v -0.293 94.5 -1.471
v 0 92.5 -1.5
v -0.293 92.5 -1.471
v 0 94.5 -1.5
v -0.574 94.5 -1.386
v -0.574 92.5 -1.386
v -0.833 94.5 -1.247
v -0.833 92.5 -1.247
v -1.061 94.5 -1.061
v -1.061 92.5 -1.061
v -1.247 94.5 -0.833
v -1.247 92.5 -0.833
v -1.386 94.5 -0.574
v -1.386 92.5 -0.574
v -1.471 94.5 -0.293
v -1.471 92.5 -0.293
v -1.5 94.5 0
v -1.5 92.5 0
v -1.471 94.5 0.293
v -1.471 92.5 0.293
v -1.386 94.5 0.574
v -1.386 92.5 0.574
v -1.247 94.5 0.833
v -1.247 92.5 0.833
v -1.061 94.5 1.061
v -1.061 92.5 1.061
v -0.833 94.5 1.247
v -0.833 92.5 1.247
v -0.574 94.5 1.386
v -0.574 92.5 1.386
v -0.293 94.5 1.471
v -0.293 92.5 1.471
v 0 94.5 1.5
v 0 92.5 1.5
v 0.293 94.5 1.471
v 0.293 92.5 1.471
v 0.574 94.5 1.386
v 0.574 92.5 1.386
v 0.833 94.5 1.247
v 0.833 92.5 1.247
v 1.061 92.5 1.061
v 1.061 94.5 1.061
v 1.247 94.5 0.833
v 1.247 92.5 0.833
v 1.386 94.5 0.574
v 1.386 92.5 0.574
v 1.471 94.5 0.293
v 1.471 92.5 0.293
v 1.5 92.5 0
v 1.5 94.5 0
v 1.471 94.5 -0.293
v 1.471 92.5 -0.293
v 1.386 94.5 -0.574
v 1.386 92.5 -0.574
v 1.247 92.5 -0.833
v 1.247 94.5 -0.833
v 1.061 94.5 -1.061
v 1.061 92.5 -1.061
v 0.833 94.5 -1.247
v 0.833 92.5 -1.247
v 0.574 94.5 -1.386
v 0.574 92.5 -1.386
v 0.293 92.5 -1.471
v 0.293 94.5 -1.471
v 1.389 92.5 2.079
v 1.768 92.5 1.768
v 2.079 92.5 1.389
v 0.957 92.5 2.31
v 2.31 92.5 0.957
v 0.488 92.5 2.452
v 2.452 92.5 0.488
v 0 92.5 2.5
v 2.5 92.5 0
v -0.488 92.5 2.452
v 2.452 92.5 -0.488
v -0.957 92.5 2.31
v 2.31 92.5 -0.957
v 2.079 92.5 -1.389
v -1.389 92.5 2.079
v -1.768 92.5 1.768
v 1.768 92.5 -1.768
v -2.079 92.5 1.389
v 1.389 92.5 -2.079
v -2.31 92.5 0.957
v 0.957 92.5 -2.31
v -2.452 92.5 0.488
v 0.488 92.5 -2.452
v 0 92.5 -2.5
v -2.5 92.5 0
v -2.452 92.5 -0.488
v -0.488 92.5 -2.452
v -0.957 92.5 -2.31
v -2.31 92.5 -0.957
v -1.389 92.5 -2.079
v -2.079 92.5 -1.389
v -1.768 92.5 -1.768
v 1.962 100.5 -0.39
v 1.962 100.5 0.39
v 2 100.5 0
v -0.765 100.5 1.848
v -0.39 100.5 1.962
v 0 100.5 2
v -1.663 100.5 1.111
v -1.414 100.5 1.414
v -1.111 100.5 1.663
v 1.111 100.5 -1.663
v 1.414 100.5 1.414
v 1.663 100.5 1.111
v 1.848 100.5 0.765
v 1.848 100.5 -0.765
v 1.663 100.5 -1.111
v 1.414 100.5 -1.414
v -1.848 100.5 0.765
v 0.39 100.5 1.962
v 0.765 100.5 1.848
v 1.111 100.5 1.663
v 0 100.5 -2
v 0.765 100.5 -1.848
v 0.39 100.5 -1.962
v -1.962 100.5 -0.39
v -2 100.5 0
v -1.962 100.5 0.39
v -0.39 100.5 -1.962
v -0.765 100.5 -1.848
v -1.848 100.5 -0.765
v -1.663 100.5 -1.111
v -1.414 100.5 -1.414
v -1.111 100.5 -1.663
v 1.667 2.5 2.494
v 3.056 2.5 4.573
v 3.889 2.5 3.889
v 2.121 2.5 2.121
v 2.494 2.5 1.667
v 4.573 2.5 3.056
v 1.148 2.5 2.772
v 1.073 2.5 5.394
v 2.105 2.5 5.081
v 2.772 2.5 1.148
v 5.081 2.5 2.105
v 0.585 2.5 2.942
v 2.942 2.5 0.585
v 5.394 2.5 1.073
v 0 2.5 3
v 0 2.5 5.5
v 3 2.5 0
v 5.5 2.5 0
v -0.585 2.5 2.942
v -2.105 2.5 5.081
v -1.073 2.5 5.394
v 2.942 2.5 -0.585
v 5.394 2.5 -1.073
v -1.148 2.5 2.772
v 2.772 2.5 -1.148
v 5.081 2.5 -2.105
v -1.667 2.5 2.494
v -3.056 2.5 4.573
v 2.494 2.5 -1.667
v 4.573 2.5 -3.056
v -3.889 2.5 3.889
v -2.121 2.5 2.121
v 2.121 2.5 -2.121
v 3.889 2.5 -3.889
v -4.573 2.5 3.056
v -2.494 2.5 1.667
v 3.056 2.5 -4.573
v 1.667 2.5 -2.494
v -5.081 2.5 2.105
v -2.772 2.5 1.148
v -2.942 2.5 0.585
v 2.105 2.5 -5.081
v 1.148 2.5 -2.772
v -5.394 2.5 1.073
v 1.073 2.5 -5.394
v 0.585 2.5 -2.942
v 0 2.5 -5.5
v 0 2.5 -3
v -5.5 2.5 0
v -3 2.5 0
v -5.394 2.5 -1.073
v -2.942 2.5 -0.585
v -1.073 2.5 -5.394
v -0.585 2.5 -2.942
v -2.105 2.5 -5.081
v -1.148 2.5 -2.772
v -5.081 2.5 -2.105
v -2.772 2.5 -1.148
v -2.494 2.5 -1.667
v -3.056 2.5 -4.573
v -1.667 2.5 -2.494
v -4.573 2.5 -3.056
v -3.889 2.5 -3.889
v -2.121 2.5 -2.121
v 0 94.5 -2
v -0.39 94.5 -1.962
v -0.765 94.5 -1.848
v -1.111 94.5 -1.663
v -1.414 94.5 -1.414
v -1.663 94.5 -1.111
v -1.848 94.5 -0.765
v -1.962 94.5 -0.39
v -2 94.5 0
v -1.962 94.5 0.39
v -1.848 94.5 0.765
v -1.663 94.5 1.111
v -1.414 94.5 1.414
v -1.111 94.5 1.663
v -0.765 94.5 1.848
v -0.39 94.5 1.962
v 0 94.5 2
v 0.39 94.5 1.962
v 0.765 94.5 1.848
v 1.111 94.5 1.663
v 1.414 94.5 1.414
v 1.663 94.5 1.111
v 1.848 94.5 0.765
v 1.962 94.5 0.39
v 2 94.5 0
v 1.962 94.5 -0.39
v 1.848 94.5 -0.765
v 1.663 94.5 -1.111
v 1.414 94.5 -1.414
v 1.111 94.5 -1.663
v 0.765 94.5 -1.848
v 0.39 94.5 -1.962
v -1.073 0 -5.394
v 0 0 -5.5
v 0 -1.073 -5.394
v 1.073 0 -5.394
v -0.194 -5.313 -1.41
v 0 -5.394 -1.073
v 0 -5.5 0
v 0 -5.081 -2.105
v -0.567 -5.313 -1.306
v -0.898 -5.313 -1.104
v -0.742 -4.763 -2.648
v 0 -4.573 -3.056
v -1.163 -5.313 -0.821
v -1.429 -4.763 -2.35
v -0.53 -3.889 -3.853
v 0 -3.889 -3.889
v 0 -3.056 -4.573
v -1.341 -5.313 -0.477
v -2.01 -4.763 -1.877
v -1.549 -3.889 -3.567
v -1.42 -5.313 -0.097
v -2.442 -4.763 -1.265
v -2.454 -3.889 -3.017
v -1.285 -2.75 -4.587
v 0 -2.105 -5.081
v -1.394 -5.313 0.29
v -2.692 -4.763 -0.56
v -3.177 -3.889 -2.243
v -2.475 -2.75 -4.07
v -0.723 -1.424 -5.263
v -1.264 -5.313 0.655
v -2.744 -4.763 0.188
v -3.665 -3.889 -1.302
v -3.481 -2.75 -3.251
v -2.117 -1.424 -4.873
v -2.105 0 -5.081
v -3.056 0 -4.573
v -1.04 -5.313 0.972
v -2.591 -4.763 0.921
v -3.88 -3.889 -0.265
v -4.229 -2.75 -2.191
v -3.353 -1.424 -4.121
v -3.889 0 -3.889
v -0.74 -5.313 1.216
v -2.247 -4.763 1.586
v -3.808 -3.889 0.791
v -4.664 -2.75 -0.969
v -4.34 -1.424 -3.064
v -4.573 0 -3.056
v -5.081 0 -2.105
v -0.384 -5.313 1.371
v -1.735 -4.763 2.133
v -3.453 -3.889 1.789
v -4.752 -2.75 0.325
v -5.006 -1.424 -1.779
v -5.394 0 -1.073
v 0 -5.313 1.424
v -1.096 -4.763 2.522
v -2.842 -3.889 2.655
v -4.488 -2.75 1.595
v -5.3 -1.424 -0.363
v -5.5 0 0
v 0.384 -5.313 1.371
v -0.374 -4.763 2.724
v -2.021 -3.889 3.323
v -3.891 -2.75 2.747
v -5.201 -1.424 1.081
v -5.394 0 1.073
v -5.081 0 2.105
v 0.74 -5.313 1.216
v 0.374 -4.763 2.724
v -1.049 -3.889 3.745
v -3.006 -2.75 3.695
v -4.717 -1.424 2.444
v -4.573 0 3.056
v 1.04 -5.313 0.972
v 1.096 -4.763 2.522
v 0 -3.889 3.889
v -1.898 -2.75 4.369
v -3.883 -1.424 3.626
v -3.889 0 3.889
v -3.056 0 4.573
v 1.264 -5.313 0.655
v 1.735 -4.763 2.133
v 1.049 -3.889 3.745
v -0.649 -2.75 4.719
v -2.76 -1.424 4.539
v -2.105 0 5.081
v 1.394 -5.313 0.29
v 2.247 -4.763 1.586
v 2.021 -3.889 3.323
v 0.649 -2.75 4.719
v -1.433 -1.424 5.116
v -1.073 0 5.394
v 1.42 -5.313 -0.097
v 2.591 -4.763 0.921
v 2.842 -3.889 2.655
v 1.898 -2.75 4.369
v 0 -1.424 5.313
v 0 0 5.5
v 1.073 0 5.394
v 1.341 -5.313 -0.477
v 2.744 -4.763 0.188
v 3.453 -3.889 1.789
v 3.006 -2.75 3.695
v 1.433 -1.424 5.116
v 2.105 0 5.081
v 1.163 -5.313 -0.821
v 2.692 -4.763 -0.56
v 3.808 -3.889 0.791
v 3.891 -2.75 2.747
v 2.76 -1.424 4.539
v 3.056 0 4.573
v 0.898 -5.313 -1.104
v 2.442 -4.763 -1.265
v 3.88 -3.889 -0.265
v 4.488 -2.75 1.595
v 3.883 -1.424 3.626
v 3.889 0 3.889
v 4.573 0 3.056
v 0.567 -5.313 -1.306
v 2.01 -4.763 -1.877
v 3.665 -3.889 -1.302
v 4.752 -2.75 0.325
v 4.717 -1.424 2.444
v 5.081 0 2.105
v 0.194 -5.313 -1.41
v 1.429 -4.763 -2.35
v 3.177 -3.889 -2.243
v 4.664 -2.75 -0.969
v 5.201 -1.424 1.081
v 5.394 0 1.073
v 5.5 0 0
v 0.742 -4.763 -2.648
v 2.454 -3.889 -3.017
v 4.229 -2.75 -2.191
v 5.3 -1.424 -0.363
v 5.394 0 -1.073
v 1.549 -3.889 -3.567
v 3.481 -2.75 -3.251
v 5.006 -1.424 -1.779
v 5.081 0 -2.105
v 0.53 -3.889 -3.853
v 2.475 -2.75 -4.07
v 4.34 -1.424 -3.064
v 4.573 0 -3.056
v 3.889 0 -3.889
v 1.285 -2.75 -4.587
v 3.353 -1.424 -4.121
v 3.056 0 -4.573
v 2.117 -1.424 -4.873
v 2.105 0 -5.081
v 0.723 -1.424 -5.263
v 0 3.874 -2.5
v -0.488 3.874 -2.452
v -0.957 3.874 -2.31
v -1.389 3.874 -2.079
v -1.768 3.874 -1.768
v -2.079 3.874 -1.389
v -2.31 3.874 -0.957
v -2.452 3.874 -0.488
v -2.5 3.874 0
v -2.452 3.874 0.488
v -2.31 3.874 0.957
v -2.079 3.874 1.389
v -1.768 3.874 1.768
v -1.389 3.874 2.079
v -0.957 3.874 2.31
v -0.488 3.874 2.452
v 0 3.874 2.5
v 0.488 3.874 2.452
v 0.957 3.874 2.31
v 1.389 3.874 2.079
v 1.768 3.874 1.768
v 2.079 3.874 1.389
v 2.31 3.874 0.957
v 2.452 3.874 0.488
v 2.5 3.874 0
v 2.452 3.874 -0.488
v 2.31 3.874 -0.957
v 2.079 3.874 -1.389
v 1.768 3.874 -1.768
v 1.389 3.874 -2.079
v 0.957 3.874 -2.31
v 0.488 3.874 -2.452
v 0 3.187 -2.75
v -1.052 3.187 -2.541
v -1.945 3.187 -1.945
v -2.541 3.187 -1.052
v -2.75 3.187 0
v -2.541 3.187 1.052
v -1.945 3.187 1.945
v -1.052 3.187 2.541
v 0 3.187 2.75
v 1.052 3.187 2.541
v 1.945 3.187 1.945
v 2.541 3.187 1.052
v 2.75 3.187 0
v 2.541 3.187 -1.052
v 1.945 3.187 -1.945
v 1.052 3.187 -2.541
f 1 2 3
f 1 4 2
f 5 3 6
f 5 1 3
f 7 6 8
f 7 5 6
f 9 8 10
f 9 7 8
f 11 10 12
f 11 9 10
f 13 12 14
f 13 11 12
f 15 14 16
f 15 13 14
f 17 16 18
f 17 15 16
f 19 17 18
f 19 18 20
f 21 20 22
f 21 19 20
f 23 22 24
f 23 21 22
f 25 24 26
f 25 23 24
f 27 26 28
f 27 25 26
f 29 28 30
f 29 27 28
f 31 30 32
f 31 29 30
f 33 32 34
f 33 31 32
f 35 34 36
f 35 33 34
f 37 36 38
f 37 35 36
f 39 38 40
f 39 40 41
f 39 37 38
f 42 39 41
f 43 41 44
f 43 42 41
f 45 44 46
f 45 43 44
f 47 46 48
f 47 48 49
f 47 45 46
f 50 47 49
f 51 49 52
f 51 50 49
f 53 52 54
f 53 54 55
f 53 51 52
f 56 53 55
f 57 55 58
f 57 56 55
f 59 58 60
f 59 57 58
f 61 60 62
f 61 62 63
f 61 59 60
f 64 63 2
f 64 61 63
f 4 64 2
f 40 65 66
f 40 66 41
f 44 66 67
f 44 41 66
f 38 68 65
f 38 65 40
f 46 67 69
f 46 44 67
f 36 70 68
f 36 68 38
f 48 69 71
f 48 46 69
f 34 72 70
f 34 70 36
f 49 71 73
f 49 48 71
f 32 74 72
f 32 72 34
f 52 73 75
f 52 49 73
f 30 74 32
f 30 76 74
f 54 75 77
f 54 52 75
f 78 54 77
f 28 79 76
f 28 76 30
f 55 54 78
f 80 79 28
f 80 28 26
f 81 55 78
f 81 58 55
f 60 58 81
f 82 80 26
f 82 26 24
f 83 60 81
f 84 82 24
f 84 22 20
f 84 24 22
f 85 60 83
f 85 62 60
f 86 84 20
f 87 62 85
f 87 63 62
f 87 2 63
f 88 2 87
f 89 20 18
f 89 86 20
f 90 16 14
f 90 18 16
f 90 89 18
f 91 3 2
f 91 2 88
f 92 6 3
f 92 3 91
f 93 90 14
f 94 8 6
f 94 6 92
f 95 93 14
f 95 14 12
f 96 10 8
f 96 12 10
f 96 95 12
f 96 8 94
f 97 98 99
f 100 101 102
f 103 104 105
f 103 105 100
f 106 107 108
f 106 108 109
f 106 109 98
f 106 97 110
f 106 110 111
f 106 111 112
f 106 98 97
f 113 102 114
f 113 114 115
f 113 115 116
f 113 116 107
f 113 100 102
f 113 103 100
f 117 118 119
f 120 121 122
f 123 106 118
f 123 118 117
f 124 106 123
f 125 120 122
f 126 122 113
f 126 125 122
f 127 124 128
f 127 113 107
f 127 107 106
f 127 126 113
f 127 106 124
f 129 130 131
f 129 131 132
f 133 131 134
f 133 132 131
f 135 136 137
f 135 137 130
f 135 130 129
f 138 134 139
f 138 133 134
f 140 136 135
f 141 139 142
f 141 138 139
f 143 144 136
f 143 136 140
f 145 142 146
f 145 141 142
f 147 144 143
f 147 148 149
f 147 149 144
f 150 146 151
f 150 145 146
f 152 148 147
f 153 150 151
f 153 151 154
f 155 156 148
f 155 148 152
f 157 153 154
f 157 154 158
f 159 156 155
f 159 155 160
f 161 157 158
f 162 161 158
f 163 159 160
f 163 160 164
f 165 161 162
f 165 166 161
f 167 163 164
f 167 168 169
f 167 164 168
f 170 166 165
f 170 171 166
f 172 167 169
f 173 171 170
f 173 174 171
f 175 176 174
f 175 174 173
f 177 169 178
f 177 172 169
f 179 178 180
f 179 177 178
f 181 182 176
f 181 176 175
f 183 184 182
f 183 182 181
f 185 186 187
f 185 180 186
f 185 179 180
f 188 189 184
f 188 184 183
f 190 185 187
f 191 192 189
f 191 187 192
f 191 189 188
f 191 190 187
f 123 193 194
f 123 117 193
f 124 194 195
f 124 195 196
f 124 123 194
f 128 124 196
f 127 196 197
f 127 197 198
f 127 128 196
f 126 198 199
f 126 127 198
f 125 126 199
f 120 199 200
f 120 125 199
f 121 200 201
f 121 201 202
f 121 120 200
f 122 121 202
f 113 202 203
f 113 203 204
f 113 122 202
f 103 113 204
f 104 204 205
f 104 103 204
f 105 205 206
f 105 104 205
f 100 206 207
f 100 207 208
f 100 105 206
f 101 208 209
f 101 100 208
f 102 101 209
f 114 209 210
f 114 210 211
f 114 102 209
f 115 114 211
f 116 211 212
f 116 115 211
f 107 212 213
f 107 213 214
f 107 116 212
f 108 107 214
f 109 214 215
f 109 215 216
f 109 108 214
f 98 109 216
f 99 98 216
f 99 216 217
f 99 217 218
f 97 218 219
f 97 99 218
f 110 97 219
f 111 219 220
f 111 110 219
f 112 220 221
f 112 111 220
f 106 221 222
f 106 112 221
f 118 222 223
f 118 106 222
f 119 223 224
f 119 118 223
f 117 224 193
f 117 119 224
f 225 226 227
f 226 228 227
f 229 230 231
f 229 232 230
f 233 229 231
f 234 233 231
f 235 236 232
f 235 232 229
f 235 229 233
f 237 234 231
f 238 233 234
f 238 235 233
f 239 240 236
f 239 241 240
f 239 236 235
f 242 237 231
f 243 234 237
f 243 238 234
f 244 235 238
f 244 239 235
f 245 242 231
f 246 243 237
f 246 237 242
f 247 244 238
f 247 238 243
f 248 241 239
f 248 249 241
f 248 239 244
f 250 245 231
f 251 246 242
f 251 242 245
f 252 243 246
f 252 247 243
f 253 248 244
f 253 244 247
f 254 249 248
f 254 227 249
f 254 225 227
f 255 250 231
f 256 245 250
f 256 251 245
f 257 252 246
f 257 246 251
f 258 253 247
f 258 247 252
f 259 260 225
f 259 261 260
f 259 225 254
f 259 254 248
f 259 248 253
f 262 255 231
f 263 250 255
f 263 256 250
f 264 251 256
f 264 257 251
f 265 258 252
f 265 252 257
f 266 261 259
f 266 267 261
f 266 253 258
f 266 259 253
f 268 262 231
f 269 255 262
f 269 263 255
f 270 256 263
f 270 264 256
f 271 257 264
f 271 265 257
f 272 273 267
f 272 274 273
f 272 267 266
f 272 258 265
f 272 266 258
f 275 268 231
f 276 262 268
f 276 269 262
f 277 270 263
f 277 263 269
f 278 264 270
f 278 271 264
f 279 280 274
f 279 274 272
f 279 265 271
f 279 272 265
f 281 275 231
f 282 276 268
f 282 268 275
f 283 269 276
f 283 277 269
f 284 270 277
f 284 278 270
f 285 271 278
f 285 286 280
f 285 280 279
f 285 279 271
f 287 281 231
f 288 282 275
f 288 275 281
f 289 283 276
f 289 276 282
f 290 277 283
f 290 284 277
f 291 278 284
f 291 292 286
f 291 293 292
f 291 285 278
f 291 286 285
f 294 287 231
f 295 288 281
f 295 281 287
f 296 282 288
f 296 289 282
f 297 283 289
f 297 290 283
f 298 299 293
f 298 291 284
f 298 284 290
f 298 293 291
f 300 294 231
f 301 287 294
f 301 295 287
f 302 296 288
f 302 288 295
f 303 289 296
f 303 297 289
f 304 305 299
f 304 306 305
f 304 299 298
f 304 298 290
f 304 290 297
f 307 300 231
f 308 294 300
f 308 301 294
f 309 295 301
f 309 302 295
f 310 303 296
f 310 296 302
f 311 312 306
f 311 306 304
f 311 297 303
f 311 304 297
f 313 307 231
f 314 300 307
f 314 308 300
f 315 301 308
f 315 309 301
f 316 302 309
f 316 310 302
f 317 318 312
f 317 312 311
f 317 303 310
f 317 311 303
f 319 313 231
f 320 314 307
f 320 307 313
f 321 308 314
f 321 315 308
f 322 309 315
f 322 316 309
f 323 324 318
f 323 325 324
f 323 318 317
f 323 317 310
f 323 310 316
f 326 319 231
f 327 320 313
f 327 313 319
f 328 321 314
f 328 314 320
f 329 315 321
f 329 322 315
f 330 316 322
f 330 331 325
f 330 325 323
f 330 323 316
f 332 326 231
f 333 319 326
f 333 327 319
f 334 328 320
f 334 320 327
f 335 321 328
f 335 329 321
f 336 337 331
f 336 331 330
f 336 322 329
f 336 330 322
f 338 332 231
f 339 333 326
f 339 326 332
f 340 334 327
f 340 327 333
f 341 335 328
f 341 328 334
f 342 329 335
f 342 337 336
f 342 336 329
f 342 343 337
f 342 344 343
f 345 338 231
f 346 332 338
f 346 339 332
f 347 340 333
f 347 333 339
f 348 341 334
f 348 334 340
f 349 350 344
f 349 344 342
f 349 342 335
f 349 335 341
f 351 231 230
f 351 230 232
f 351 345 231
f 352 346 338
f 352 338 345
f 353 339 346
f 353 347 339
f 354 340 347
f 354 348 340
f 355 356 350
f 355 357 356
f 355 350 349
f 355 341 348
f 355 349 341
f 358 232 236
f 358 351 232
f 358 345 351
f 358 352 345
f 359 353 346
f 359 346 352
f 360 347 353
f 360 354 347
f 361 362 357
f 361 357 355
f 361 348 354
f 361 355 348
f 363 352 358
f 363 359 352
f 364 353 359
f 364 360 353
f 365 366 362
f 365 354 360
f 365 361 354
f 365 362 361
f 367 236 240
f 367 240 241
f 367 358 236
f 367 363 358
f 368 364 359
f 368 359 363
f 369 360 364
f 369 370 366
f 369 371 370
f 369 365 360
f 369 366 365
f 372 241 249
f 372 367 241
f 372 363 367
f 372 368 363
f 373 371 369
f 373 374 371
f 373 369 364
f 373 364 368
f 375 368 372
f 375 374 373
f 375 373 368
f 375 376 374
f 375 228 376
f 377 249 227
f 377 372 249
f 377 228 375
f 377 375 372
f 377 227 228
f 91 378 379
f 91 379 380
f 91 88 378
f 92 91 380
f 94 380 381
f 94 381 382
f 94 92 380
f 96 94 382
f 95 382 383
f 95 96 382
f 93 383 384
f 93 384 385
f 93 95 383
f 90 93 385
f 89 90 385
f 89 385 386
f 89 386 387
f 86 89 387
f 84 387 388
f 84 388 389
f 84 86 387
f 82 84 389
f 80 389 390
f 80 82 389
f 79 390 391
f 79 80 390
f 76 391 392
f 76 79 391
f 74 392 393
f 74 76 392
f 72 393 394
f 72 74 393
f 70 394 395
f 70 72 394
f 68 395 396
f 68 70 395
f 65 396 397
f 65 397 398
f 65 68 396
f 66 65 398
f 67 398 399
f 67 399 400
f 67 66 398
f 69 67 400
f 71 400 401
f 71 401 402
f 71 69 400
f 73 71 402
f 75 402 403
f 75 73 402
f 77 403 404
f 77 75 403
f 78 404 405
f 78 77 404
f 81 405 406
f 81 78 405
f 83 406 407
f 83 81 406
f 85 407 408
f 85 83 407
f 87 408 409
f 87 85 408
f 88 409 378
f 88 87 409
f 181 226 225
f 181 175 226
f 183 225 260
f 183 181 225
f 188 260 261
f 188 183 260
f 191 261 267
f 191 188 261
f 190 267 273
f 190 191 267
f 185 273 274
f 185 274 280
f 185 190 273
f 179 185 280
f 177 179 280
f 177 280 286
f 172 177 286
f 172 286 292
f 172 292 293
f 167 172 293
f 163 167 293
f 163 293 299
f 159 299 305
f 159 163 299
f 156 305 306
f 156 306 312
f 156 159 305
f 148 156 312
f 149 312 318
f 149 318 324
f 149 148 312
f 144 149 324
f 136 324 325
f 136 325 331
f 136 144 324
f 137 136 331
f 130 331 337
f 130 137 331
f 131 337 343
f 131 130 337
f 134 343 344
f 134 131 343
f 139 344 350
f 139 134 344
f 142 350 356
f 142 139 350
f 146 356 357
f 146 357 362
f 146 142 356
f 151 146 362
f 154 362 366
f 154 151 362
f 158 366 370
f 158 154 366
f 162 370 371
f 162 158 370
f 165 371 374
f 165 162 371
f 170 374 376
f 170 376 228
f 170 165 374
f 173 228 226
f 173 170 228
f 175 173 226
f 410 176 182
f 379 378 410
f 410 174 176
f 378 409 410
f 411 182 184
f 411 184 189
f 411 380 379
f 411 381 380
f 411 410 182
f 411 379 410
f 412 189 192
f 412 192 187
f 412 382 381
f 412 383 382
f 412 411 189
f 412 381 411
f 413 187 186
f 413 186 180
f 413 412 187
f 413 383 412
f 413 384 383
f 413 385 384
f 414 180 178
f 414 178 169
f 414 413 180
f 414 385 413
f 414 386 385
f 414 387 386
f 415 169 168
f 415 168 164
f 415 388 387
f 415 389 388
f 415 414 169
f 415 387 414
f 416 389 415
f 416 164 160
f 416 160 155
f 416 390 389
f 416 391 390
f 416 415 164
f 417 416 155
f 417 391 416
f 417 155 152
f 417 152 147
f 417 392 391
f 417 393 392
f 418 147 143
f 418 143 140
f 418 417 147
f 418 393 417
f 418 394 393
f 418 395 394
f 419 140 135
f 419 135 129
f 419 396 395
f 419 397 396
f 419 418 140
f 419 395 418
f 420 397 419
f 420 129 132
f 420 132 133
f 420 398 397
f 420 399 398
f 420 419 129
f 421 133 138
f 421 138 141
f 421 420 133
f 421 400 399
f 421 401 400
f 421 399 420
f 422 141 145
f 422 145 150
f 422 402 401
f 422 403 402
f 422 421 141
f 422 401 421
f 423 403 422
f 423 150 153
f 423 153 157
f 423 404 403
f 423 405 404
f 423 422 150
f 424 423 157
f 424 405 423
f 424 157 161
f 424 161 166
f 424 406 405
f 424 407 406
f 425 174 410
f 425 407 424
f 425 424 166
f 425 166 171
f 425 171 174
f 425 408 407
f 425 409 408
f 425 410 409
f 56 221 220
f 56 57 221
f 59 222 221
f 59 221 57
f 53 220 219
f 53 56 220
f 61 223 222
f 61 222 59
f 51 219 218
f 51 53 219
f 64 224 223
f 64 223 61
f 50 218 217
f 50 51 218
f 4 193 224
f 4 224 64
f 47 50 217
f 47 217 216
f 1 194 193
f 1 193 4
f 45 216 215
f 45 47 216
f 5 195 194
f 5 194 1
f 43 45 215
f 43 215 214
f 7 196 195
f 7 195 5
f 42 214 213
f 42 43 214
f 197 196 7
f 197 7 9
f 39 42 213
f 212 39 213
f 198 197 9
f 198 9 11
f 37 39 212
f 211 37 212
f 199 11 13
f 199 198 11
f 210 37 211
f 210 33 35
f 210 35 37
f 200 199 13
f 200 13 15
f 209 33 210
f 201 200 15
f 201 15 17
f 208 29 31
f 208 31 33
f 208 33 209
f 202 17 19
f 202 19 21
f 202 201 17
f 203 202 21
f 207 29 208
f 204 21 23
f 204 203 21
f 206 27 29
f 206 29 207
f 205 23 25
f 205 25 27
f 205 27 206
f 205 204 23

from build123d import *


with BuildPart() as part:
    # Sketch1 → Revolve1 (revolve)
    with BuildSketch(Plane.XY, mode=Mode.PRIVATE) as revolve1_sk:
        with BuildLine():
            Line((5.5, 0), (5.5, 2.5))
            Line((5.5, 2.5), (3, 2.5))
            Line((3, 2.5), (2.5, 3.87373871))
            Line((2.5, 3.87373871), (2.5, 92.5))
            Line((2.5, 92.5), (1.5, 92.5))
            Line((1.5, 92.5), (1.5, 94.5))
            Line((1.5, 94.5), (2, 94.5))
            Line((2, 94.5), (2, 100.5))
            Line((2, 100.5), (0, 100.5))
            Line((0, 100.5), (0, -5.5))
            ThreePointArc((0, -5.5), (3.889087297, -3.889087297), (5.5, 0))
        make_face()
    revolve(revolve1_sk.sketch.rotate(Axis((0, 0, 0), (0, 1, 0)), 90), axis=Axis((0, 0, 0), (0, 1, 0)))


solid = part.part
